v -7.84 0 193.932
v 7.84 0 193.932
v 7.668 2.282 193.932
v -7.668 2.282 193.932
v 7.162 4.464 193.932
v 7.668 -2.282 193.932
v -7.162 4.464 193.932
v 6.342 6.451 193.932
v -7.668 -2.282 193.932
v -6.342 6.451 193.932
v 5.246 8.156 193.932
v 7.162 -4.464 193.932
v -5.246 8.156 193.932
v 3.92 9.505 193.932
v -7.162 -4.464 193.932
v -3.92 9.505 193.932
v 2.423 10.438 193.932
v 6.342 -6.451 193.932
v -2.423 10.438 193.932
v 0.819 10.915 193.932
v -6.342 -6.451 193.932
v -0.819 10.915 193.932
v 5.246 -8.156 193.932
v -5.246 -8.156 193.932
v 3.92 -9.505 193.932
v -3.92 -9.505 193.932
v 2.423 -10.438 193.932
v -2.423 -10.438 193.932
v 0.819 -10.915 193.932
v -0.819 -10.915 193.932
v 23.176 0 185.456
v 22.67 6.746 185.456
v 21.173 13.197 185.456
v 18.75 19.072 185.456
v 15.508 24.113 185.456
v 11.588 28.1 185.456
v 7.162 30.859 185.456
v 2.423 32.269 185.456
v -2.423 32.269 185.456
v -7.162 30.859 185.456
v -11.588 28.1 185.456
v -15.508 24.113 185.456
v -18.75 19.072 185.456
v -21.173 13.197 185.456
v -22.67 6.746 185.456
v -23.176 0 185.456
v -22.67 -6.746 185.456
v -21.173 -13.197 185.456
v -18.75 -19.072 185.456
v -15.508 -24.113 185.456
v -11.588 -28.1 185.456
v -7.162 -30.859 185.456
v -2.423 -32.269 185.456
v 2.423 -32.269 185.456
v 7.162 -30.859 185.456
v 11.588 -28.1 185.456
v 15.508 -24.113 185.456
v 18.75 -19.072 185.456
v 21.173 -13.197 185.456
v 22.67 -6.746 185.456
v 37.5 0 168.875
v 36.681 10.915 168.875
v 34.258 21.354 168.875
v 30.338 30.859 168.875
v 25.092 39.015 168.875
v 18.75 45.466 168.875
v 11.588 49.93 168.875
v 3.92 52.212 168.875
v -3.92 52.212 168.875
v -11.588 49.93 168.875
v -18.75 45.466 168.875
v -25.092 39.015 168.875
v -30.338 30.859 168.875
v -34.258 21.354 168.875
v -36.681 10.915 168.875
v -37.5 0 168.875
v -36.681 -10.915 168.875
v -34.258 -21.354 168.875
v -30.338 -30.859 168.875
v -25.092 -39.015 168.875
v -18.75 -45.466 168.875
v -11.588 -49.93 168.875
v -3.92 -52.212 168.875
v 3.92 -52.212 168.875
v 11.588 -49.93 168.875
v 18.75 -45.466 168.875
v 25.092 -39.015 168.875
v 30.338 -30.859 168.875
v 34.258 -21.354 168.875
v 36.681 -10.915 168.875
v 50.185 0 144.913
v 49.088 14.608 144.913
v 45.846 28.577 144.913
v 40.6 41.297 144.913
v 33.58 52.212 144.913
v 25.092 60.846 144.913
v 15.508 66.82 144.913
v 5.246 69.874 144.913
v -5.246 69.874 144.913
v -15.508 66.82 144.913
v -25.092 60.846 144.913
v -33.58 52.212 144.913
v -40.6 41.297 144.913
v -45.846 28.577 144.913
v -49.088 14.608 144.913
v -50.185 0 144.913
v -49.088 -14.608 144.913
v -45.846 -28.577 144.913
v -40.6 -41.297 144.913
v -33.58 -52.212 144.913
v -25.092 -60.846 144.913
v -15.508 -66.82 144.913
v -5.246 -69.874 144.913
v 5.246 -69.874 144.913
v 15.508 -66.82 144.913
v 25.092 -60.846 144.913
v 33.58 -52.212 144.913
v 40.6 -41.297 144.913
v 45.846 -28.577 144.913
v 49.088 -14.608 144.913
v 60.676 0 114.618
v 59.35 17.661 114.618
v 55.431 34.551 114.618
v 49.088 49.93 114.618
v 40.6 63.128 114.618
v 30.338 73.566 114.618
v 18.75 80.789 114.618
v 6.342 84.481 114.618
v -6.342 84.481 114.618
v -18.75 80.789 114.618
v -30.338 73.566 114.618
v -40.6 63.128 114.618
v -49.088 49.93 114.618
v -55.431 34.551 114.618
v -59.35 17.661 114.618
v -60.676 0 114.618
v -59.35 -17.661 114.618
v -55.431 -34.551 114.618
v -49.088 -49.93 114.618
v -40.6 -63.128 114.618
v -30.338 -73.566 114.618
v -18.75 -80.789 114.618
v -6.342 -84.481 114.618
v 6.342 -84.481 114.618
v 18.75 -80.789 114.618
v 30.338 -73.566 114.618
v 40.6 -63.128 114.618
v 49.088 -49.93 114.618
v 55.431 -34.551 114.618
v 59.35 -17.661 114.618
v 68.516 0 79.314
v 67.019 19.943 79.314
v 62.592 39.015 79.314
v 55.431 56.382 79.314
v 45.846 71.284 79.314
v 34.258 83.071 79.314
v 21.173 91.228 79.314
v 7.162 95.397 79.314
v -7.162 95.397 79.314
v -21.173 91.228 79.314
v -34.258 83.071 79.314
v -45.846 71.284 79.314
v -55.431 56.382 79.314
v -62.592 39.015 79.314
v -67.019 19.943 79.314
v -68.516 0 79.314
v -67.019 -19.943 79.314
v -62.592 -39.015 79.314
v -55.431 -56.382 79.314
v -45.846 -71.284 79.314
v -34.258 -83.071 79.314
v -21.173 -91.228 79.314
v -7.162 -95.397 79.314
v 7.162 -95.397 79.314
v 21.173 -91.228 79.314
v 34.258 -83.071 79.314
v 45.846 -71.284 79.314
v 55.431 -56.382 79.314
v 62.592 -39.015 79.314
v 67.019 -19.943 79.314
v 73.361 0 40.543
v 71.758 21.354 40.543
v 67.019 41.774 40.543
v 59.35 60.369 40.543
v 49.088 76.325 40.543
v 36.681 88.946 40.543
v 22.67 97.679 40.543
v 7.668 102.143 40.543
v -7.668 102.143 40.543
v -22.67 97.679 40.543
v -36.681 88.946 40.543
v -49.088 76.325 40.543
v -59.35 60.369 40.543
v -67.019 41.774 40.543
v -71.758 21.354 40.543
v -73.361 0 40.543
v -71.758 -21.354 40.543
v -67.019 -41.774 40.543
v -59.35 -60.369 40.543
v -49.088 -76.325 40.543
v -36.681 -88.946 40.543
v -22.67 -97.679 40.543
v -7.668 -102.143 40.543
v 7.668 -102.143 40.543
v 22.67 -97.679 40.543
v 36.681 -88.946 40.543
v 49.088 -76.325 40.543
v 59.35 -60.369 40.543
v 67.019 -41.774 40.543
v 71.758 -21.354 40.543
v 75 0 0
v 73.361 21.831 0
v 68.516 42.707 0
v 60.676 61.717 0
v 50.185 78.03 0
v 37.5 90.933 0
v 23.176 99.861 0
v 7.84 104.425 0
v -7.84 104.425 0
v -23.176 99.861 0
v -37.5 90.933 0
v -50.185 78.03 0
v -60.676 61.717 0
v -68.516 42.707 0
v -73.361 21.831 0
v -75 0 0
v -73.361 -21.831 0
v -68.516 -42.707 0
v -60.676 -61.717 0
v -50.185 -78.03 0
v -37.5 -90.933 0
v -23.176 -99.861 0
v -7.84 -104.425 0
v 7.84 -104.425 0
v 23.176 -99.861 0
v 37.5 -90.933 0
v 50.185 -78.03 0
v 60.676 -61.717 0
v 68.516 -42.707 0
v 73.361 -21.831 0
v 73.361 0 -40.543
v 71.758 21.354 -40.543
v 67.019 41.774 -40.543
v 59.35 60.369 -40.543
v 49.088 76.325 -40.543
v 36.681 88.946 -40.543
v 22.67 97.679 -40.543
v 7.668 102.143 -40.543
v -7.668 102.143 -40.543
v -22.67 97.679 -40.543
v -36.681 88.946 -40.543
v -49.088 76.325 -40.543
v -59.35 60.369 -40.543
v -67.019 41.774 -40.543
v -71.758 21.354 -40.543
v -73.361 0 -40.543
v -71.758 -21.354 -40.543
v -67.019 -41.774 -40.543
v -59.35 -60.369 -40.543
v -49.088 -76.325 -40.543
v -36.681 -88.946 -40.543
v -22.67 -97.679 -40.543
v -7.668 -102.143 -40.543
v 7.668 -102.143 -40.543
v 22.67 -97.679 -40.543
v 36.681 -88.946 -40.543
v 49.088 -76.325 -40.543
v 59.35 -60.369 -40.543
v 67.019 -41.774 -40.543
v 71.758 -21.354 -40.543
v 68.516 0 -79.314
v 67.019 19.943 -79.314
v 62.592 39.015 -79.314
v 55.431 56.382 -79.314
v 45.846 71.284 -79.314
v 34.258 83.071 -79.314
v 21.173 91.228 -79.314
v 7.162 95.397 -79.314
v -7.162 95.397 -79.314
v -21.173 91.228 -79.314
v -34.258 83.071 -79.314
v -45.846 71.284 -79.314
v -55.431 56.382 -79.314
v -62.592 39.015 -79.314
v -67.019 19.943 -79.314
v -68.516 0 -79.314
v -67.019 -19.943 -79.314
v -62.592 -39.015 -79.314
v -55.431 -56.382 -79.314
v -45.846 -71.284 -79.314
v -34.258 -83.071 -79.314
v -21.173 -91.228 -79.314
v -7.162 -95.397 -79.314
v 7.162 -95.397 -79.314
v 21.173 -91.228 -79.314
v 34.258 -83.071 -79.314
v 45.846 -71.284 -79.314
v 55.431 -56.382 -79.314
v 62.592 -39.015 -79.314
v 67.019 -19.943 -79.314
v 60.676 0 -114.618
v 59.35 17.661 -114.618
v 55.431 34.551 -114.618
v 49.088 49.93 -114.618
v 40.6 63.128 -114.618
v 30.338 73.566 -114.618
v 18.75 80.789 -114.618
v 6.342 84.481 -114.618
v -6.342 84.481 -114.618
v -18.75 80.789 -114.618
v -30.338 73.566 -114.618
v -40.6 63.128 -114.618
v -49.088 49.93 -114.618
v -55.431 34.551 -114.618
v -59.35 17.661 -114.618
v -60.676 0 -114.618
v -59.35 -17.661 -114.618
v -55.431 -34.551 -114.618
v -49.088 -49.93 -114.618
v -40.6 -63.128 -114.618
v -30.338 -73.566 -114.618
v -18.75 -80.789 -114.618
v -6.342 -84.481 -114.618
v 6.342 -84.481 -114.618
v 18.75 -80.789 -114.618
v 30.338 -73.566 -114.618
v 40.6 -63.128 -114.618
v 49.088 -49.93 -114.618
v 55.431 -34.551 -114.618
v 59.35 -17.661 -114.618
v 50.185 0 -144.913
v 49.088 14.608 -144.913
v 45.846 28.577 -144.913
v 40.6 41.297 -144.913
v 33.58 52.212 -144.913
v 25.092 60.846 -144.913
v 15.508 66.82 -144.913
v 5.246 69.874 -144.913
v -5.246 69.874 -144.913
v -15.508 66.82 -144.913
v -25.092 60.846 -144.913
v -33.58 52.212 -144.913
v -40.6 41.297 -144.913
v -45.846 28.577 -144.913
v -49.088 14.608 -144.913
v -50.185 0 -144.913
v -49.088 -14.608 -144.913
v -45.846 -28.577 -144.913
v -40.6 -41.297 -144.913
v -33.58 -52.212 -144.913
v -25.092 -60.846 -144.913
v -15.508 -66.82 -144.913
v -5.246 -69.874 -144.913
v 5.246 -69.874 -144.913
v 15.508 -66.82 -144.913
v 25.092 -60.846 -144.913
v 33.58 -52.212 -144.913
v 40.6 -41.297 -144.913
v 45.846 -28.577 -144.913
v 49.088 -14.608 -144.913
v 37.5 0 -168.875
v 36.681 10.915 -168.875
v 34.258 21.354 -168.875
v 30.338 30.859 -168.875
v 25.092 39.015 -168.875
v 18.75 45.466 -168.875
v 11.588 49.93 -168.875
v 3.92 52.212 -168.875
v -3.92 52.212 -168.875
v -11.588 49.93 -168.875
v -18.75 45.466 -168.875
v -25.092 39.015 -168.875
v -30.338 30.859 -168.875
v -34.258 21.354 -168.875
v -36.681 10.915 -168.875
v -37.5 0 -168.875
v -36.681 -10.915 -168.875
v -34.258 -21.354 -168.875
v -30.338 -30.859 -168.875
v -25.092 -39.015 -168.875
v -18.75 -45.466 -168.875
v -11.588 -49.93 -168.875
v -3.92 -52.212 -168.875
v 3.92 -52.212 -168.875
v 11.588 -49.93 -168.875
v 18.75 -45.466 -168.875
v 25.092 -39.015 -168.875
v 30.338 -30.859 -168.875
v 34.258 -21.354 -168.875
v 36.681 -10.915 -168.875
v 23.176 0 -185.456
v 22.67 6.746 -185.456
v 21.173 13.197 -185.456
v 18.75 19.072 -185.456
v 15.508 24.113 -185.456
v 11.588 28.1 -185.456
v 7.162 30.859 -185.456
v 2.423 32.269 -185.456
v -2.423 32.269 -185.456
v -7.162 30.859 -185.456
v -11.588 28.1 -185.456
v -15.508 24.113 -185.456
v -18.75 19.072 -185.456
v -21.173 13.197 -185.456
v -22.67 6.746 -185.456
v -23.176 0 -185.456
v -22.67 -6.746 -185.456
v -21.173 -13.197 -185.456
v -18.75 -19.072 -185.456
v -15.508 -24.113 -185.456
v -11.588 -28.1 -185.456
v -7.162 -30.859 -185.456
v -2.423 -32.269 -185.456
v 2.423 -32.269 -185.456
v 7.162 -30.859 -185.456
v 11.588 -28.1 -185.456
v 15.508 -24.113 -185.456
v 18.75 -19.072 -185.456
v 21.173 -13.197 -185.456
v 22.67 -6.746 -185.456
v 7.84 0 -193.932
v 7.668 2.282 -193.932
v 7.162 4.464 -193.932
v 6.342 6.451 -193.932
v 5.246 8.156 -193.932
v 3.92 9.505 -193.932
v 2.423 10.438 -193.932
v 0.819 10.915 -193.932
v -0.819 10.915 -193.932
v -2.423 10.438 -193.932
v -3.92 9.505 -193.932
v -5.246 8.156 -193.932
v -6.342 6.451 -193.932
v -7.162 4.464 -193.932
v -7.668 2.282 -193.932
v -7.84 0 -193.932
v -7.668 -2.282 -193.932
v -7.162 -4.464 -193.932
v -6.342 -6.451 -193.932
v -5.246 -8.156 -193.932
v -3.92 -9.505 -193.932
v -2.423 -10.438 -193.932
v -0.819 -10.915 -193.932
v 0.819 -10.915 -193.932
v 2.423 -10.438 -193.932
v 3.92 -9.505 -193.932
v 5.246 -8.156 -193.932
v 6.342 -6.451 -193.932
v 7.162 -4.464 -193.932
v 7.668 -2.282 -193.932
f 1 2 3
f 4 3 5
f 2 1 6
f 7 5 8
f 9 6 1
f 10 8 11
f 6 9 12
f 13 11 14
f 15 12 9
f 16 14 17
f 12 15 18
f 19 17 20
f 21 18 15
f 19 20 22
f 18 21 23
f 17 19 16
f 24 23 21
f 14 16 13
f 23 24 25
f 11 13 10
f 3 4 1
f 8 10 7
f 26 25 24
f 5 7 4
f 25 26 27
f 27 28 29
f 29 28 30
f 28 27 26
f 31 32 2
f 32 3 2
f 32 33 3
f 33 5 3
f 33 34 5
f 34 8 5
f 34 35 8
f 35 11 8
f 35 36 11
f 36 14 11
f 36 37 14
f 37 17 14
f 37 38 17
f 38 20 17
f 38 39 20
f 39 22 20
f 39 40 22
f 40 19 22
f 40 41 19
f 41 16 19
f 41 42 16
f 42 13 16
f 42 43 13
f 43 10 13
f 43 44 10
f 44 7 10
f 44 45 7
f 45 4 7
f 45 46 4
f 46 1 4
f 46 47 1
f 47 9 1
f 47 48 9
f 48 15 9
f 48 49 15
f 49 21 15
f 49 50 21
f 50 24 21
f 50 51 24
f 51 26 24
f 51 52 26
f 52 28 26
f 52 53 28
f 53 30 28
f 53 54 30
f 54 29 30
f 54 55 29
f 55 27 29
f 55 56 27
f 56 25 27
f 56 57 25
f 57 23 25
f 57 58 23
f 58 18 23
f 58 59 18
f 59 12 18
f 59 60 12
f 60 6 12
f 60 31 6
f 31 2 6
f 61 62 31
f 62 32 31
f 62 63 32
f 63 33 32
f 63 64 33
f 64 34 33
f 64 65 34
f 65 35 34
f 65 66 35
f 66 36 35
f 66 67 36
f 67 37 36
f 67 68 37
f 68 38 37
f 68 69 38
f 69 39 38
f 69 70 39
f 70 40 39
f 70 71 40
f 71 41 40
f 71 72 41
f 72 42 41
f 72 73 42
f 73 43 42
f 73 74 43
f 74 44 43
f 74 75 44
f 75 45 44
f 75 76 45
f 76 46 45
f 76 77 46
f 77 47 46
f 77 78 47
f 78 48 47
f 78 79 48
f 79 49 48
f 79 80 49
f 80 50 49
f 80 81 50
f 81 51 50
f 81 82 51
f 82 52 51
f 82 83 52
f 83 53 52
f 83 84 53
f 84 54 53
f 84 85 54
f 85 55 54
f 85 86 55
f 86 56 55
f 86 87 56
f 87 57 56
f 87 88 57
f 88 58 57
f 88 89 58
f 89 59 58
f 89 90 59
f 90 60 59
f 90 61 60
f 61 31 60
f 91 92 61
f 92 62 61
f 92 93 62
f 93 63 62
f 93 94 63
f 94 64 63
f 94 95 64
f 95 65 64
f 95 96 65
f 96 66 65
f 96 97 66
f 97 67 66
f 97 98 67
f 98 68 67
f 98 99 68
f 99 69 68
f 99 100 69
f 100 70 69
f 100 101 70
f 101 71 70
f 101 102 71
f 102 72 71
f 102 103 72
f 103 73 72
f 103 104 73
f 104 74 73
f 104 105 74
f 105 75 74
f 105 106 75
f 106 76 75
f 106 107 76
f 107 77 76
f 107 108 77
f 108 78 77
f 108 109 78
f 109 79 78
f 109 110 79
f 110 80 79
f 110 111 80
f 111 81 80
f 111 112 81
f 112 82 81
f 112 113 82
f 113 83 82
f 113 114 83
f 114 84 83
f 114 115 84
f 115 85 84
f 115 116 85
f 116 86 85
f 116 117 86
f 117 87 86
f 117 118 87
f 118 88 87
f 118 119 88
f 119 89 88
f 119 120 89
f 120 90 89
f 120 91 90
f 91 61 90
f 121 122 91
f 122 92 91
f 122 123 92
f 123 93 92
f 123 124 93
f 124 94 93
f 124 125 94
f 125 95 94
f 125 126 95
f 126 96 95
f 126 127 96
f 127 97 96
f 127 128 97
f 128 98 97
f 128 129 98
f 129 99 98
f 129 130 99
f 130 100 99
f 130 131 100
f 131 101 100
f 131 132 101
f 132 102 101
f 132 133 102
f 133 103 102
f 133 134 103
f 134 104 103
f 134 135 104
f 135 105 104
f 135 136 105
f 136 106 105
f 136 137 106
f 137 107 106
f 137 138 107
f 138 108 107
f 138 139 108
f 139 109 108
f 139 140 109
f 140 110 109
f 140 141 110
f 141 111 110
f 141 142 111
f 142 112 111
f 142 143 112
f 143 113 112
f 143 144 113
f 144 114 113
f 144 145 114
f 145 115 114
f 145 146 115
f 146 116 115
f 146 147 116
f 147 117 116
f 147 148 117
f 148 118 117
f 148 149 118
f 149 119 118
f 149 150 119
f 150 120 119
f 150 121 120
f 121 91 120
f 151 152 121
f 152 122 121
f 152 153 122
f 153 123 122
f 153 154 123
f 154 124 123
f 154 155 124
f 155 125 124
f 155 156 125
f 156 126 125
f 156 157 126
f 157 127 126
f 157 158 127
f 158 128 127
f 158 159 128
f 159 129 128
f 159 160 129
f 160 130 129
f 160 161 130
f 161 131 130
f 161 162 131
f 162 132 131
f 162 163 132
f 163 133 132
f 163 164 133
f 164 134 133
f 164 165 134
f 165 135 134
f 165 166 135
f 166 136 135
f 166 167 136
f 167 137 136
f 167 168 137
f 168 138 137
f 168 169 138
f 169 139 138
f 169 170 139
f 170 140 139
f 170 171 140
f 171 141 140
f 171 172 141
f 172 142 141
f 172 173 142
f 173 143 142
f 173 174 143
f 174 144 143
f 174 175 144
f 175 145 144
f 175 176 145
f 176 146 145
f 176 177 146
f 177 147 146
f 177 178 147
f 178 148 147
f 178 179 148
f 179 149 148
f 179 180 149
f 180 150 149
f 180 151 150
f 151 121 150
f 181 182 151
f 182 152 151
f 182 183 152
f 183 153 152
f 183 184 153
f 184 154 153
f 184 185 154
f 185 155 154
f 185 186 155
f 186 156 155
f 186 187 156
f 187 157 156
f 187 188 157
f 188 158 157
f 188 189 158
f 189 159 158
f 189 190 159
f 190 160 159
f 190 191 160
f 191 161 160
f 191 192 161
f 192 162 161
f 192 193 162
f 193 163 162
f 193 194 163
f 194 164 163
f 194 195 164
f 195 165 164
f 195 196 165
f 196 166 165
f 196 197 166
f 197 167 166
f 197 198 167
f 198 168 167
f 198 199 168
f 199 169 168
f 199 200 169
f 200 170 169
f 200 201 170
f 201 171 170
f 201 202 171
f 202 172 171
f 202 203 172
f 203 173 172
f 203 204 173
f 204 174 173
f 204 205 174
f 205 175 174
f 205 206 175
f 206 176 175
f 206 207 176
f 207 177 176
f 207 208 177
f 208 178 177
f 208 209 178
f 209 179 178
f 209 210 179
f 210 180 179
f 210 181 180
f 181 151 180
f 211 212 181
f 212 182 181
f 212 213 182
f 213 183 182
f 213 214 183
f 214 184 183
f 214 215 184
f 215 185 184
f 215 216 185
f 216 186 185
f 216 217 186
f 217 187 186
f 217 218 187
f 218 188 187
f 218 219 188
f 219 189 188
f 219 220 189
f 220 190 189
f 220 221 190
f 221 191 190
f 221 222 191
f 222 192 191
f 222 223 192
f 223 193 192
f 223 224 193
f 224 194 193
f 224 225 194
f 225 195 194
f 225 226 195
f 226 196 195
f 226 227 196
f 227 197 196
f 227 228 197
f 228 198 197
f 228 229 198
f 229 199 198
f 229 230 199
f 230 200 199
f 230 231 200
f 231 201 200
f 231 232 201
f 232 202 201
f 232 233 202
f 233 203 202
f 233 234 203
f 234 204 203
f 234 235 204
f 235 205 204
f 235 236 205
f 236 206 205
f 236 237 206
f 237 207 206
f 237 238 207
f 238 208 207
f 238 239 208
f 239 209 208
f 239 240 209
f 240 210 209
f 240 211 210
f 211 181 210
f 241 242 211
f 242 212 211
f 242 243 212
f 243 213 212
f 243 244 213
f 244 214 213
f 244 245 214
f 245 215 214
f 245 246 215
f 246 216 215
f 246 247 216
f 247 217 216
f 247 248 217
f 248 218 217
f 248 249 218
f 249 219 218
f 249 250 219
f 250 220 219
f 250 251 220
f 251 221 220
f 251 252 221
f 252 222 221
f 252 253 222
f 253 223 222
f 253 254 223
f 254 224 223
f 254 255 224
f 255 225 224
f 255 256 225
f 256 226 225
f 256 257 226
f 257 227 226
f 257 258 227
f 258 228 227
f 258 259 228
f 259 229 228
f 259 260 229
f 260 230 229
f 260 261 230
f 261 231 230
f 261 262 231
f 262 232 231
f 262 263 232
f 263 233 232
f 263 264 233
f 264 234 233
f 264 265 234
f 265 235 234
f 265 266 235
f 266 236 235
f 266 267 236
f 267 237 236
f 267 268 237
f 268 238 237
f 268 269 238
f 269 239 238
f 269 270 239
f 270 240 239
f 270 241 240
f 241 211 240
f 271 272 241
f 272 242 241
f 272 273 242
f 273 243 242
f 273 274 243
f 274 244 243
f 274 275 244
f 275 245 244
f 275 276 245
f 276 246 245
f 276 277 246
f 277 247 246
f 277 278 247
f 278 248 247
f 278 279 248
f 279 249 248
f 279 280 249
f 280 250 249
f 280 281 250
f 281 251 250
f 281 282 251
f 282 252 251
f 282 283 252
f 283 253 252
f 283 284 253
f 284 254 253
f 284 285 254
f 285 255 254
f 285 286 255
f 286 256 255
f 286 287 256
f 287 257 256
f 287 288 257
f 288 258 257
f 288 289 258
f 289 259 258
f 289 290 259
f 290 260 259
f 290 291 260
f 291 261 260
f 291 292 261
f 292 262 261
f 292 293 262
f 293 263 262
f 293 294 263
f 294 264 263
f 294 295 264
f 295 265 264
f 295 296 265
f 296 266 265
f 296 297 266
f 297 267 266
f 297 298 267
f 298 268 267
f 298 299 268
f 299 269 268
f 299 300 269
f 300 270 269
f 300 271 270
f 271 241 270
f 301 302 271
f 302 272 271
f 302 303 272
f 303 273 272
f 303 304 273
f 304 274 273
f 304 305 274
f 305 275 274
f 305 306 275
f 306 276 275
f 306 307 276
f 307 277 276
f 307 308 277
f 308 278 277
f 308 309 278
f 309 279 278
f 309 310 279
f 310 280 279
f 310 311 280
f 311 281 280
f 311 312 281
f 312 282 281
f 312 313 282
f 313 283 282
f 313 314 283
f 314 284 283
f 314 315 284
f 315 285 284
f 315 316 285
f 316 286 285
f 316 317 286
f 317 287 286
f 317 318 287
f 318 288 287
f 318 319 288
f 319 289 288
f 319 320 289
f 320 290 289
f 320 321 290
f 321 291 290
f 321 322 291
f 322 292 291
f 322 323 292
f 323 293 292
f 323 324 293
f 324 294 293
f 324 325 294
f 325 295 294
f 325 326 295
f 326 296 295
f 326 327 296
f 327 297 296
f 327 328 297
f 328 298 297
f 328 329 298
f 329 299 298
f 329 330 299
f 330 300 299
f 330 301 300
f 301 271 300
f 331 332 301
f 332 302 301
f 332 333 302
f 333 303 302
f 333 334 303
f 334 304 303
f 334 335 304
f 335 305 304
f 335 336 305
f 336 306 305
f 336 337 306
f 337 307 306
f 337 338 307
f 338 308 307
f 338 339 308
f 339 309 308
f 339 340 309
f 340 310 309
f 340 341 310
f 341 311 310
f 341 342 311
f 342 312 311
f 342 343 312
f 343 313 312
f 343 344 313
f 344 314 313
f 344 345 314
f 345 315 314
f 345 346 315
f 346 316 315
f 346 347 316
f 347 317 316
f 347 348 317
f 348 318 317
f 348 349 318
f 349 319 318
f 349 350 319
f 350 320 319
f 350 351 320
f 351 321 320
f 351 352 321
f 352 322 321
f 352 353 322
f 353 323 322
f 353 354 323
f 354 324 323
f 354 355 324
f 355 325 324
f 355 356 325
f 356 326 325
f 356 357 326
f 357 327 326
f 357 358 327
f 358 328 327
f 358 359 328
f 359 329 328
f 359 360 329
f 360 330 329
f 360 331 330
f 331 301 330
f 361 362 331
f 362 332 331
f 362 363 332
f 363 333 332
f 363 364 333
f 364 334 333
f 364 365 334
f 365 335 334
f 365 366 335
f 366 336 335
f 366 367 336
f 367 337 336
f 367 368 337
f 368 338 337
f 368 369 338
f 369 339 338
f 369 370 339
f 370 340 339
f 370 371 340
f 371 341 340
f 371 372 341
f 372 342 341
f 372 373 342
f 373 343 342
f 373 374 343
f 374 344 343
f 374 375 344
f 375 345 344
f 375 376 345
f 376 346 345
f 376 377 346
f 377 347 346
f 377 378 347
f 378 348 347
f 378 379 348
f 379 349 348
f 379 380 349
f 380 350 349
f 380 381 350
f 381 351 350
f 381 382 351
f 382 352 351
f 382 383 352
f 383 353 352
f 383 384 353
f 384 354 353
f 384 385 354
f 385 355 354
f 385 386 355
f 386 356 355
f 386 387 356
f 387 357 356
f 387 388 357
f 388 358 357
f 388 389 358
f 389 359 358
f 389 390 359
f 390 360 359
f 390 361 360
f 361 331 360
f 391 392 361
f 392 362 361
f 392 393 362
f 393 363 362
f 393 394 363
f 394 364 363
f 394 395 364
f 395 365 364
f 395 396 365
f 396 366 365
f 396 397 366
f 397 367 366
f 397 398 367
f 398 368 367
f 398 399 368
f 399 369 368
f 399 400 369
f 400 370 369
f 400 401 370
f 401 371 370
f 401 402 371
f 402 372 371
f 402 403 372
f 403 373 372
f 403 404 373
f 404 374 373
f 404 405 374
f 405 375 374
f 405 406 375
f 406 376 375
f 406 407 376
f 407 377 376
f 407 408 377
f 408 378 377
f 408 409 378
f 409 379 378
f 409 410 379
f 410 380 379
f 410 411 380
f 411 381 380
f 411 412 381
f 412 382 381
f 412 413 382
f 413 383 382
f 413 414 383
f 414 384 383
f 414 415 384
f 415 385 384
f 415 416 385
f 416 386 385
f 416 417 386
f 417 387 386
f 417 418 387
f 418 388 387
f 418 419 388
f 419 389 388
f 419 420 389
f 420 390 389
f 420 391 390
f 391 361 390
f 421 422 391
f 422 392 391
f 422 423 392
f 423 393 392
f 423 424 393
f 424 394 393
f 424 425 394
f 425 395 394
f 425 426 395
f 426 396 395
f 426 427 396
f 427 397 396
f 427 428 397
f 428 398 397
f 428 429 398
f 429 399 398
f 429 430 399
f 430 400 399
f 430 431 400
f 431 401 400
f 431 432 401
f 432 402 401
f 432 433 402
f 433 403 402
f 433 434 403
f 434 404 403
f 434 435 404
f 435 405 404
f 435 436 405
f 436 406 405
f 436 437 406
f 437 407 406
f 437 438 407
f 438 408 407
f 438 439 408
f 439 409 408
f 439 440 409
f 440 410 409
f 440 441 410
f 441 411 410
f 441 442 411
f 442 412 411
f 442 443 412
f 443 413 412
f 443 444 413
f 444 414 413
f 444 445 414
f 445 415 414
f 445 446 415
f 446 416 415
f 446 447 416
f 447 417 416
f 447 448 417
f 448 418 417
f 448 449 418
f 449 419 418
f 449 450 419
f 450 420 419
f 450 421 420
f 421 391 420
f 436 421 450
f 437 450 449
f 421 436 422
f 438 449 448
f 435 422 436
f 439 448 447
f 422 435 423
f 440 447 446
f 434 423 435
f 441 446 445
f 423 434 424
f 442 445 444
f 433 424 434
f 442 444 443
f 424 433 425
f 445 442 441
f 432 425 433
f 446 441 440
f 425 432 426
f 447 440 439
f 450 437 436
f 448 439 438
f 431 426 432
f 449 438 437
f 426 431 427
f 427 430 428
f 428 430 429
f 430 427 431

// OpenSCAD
// Generated by SolidPython 1.0.1 on 2020-07-29 00:46:46


scale(v = [5, 7, 13]) {
	sphere(r = 15);
}
/***********************************************
*********      SolidPython code:      **********
************************************************
 
# import packages: SolidPython
from solid import *
from solid.utils import *
from itertools import chain, combinations, permutations


class Resize:

    def __init__(self, scad_file):
        self.scad_file = scad_file
        #self.scad_file = import_scad(scad_file)
        # cone/cylinder param:
        self.r1 = 0
        self.r2 = 0
        self.h = 0
        # rectangular prism param:
        self.w = 0
        self.l = 0
        # ellipse param:
        self.r = 0

    # import OpenScad code (file name corresponds to shape)


    # classify shape + parameters
    def assign(self, param1, param2, param3):
        if self.scad_file == 'cone.scad':
            self.r1 = param1
            self.r2 = param2
            self.h = param3
        elif self.scad_file == 'cylinder.scad':
            self.r1 = param1
            self.r2 = param2
            self.h = param3
        elif self.scad_file == 'rectangularPrism.scad':
            self.h = param1
            self.l = param2
            self.w = param3
        else:
            self.r = param1
            self.h = param2

    # resize parameters
    def iterate(self):
        x = range(3, 20, 2)
        i = 1
        if self.scad_file == 'cone.scad':
            tempList = list(permutations(x, 2))
            for temp in tempList:
                param1 = temp[0]
                param2 = temp[1]
                filepath = 'produced_scad_files/' + 'cone' + str(param1) + '_' + str(param2) + '_' + '.scad'
                scad_render_to_file(cylinder(h=param1, r1=param2, r2=0), filepath)

        elif self.scad_file == 'cylinder.scad':
            tempList = list(permutations(x, 3))
            for temp in tempList:
                param1 = temp[0]
                param2 = temp[1]
                filepath = 'produced_scad_files/' + 'cylinder' + str(param1) + '_' + str(param2) + '_' + '.scad'
                scad_render_to_file(cylinder(h=param1, r1=param2, r2=param2), filepath)

        elif self.scad_file == 'rectangularPrism.scad':
            tempList = list(permutations(x, 3))
            for temp in tempList:
                param1 = temp[0]
                param2 = temp[1]
                param3 = temp[2]
                filepath = 'produced_scad_files/' + 'rectangularPrism' + str(param1) + '_' + str(param2) + '_' + str(
                    param3) + '.scad'
                scad_render_to_file(cube(size=(param1, param2, param3)), filepath)

        elif self.scad_file == 'ellipse.scad':
            tempList = list(permutations(x, 4))
            for temp in tempList:
                param1 = temp[0]
                param2 = temp[1]
                param3 = temp[2]
                param4 = temp[3]
                filepath = 'produced_scad_files/' + 'ellipse' + str(param1) + '_' + str(param2) + '_' + str(param3) + '_' + str(param4) + '.scad'
                scad_render_to_file(scale([param1, param2, param3])(sphere(r=param4)), filepath)

    def render_to_scadfile(self):
        scad_render_to_file(scad, 'example.scad') 
 
************************************************/
